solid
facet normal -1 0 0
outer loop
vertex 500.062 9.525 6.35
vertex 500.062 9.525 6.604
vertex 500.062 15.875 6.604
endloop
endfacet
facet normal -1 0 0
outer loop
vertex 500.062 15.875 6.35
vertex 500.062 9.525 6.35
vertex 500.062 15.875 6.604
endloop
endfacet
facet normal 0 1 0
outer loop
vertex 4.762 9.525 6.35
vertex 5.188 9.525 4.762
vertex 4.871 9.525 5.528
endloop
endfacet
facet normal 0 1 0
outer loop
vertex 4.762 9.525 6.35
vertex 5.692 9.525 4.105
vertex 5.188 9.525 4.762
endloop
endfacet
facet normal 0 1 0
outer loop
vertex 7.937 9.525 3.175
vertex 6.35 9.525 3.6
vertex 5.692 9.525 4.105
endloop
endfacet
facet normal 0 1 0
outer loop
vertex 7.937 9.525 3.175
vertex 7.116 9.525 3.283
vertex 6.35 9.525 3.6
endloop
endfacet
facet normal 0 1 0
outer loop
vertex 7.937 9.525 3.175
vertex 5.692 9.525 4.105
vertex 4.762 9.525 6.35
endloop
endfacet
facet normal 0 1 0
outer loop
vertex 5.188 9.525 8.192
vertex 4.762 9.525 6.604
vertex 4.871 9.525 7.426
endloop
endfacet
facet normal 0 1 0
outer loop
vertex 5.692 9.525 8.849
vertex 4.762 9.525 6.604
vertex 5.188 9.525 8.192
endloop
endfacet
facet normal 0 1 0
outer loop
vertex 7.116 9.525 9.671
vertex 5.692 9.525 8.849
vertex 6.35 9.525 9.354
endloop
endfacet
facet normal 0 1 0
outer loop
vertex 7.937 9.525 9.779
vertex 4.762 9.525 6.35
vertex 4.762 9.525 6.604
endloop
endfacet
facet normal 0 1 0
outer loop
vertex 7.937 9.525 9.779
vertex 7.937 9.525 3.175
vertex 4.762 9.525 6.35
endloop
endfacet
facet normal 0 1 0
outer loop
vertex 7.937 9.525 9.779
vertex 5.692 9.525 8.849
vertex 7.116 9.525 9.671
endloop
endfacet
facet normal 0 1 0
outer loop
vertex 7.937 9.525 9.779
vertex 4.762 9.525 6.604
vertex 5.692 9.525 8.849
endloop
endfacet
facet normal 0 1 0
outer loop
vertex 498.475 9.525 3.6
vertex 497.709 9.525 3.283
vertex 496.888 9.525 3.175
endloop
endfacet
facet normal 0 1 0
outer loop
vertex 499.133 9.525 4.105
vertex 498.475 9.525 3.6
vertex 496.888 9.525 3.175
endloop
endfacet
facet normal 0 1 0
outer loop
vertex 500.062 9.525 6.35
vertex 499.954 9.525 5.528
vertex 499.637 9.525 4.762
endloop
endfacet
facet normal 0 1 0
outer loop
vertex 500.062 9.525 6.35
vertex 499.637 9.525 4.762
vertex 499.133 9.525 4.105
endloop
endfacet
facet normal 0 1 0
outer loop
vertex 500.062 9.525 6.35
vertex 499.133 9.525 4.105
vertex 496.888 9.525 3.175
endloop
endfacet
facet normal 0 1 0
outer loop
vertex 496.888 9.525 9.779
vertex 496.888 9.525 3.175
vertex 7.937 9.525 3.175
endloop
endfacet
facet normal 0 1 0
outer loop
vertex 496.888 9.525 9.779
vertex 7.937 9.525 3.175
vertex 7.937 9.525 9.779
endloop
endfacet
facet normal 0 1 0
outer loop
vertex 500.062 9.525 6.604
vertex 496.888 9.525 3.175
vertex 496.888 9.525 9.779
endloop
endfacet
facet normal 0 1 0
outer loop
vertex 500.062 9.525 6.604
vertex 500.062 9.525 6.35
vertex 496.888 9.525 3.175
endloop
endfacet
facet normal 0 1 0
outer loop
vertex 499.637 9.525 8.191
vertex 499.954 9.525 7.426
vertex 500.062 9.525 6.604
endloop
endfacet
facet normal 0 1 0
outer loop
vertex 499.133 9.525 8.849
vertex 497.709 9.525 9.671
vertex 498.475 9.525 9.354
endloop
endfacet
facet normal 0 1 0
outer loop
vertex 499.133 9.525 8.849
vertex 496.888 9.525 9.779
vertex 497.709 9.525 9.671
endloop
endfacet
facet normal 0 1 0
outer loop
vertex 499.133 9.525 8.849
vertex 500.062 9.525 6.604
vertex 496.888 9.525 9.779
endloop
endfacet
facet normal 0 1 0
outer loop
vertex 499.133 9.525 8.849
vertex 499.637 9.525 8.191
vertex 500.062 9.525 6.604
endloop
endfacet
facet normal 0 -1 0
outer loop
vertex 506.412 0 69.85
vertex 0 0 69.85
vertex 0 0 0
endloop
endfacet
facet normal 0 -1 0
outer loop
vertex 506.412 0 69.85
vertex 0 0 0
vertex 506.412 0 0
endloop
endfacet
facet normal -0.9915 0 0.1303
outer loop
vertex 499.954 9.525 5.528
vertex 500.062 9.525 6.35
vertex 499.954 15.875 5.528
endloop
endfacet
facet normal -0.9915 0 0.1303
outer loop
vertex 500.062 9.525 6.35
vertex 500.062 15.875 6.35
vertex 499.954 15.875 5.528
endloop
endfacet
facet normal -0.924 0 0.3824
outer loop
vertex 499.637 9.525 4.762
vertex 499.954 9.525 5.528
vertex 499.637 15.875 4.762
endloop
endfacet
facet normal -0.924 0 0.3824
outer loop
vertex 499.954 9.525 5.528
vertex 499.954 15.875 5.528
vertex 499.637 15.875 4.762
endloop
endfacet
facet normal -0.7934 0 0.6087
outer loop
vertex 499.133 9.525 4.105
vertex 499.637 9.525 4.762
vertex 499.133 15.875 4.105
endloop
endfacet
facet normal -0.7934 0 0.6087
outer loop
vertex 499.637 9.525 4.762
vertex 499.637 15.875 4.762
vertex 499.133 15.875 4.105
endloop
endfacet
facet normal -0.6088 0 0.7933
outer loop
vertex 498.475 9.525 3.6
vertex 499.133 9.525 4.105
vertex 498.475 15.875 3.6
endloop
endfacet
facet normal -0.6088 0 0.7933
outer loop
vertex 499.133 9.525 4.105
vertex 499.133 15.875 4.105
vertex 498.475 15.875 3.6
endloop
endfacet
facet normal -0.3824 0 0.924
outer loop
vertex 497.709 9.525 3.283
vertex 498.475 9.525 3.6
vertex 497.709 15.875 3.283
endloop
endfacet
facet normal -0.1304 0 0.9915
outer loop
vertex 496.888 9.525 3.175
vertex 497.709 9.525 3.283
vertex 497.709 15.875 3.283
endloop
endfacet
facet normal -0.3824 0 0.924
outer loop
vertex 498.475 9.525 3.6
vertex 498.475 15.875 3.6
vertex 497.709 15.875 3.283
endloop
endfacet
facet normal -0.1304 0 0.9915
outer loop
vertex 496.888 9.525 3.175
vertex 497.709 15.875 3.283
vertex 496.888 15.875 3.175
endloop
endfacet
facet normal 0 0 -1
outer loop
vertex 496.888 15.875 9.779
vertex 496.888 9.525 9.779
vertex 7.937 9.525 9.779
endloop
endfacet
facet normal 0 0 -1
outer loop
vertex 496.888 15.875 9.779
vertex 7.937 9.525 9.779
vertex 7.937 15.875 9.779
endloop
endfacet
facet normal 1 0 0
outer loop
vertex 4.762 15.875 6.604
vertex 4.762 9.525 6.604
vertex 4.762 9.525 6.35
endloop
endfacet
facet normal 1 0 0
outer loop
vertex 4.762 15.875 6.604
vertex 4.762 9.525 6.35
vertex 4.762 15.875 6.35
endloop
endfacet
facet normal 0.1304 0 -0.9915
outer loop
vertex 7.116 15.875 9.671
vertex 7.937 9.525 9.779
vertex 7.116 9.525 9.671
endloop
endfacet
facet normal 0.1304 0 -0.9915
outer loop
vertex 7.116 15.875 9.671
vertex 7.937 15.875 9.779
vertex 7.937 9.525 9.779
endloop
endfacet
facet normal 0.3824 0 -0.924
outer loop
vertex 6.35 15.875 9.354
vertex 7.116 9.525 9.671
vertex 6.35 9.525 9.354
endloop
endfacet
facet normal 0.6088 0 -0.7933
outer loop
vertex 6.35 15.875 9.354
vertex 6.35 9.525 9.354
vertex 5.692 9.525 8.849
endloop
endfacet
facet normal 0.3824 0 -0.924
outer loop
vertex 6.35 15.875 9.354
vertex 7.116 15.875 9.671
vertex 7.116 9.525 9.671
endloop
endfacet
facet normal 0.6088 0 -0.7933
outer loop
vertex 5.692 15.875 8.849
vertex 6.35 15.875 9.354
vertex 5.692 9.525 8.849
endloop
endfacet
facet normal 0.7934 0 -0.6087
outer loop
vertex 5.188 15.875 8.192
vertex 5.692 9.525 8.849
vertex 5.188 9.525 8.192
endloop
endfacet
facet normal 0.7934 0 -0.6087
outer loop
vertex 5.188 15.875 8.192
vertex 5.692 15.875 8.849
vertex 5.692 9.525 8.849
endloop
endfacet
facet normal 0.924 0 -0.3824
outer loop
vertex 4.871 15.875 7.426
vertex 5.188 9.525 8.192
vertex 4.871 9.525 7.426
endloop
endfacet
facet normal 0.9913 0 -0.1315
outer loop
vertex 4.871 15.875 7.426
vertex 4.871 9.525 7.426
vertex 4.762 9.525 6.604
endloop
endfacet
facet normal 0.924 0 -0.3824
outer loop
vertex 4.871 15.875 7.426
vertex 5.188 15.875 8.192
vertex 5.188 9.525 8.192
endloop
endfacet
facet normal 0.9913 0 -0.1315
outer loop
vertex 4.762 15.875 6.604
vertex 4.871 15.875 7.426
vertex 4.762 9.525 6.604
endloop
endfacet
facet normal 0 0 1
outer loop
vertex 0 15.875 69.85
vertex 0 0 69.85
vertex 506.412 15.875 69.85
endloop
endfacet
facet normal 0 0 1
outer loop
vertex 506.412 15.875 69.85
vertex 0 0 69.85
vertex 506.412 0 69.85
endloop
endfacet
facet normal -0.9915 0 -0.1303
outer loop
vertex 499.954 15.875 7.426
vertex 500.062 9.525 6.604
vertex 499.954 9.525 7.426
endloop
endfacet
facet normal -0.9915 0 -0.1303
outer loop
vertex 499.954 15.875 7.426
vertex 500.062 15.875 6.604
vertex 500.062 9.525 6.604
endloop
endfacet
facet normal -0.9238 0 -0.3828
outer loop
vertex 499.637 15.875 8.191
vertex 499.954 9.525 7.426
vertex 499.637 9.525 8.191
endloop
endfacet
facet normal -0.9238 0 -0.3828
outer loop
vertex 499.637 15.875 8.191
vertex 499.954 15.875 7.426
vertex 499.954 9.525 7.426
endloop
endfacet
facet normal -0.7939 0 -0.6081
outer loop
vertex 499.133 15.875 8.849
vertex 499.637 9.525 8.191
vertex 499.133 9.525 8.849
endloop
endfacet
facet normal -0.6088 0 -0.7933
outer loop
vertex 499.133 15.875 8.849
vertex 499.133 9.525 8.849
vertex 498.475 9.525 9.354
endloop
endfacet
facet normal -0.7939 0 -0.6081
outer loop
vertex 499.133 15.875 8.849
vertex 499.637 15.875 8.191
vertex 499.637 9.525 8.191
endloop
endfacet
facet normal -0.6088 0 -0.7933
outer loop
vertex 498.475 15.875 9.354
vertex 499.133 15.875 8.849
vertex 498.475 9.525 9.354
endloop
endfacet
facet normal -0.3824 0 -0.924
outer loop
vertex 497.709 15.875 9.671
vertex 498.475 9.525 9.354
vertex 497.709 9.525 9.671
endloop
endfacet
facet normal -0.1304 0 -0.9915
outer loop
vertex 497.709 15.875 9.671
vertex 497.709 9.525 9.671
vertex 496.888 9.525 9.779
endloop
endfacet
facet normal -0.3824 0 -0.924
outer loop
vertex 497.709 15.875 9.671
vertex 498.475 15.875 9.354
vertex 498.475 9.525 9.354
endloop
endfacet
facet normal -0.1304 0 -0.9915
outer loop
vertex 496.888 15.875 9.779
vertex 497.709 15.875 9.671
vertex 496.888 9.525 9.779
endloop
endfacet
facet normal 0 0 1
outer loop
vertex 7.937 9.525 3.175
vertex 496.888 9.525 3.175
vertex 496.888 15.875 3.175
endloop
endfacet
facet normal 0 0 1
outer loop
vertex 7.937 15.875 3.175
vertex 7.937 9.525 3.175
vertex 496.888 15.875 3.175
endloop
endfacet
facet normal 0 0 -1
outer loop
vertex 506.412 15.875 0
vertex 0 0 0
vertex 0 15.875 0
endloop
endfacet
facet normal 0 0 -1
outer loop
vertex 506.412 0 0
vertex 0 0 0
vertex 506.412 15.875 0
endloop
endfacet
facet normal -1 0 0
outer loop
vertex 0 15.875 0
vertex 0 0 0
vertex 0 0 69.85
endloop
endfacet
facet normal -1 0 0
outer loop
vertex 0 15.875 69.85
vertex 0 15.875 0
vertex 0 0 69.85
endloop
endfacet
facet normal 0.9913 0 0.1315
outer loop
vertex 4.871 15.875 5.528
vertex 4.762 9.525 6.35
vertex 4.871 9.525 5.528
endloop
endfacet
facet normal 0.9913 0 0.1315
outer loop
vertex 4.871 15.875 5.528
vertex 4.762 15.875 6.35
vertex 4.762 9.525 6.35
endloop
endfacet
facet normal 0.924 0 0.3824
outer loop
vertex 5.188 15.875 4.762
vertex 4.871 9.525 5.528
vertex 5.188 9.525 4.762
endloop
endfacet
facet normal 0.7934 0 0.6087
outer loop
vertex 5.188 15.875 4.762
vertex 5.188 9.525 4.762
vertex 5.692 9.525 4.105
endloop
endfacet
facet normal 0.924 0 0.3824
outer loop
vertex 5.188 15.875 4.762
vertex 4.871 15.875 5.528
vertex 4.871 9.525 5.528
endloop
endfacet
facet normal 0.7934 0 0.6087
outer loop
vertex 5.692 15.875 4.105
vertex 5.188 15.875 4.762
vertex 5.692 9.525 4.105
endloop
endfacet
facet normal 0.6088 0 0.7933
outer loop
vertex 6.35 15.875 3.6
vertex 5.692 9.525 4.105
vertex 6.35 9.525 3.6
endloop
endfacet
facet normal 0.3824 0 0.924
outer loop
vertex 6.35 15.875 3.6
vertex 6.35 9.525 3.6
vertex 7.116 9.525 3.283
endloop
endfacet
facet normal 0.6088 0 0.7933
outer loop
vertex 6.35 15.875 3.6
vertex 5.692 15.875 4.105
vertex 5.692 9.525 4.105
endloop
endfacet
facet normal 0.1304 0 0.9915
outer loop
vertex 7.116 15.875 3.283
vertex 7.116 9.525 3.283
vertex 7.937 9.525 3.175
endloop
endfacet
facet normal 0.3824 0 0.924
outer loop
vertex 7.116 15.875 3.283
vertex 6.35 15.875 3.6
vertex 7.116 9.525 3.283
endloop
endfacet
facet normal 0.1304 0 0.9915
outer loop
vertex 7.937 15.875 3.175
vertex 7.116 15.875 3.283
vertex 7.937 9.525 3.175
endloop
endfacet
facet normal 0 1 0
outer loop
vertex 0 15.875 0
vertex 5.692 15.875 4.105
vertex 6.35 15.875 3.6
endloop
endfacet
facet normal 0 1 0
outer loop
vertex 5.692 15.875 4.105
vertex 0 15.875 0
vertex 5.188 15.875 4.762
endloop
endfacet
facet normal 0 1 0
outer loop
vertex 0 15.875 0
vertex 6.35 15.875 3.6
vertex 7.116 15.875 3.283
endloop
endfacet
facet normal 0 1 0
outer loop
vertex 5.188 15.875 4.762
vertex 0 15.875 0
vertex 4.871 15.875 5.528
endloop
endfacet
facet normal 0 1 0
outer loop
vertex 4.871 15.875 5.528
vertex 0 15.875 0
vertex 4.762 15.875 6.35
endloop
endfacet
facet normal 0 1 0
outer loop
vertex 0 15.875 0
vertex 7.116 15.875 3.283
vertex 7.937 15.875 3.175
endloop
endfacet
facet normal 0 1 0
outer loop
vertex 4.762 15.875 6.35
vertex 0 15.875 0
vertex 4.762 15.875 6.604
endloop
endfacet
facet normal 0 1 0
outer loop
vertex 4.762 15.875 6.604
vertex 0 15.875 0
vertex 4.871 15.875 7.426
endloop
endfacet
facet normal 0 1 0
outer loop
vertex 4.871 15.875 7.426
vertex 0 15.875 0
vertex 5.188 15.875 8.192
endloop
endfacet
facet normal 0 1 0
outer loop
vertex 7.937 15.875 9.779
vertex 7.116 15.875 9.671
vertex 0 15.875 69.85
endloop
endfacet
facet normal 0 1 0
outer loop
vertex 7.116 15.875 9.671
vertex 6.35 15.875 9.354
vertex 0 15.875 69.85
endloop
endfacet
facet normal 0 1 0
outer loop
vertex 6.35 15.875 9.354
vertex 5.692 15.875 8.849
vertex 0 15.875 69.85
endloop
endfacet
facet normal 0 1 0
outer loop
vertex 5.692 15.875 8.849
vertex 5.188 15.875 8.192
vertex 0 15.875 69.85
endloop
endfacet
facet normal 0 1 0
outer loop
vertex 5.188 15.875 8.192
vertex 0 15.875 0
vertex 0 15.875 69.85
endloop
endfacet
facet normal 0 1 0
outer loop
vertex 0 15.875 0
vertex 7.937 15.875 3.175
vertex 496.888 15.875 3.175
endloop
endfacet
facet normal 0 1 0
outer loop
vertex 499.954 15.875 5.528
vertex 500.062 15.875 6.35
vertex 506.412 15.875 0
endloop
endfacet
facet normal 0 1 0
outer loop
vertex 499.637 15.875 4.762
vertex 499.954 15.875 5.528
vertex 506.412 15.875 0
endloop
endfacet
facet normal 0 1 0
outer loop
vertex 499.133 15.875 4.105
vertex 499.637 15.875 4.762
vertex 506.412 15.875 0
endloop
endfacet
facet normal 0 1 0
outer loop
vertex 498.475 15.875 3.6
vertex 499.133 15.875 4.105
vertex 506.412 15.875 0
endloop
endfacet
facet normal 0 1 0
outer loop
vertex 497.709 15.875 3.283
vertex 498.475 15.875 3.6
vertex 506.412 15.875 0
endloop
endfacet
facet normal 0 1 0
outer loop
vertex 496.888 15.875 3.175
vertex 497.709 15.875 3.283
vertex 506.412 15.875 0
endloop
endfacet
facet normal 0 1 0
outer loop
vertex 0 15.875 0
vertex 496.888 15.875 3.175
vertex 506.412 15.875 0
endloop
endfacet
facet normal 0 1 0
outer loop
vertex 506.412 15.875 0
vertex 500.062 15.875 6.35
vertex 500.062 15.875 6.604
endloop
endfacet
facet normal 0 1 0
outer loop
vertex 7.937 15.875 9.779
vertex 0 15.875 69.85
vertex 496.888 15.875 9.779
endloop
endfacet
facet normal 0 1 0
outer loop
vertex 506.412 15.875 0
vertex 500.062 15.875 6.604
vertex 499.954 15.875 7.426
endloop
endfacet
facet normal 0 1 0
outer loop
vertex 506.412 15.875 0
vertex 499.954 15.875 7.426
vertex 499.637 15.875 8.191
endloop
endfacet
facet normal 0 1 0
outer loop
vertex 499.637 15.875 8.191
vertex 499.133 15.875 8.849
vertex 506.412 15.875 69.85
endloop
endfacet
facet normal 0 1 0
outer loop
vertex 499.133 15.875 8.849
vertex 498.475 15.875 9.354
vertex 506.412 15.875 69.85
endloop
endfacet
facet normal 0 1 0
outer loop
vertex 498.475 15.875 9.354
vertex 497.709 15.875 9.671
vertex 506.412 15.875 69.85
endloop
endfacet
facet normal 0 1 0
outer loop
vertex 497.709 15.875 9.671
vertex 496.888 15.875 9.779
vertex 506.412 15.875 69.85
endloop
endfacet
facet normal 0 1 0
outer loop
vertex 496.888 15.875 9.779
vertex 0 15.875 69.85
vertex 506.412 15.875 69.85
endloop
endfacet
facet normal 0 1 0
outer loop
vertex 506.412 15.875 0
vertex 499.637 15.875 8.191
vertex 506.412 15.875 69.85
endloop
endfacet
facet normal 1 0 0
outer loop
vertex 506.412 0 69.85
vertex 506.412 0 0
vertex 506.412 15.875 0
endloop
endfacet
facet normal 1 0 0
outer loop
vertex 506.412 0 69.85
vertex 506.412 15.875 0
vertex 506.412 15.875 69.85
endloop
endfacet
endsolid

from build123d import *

# Parameters (mm, degrees)
F0_W     = 506.4125
F0_H     = 69.85
F1_DEPTH = 15.875
F3_START = -6.35
F2_W     = 6.35
F2_H     = 6.604
F3_DEPTH = 495.3
F4_R     = 3.175


with BuildPart() as f1:
    # F0 (on Front) → F1 (new body)
    with BuildSketch(Plane.XZ):
        with Locations((253.20625, 34.925)):
            Rectangle(F0_W, F0_H)
    extrude(amount=-F1_DEPTH)

    # F2 (on face) → F3 (cut)
    with BuildSketch(Plane.YZ.offset(506.4125).offset(F3_START)):
        with Locations((12.7, 6.477)):
            Rectangle(F2_W, F2_H)
    extrude(amount=-F3_DEPTH, mode=Mode.SUBTRACT)

    # F4
    f4_edges = [f1.edges().sort_by_distance(p)[0] for p in [
        (500.0625, 12.7, 9.779),
        (500.0625, 12.7, 3.175),
        (4.7625, 12.7, 3.175),
        (4.7625, 12.7, 9.779),
    ]]
    fillet(f4_edges, radius=F4_R)


solid = f1.part
